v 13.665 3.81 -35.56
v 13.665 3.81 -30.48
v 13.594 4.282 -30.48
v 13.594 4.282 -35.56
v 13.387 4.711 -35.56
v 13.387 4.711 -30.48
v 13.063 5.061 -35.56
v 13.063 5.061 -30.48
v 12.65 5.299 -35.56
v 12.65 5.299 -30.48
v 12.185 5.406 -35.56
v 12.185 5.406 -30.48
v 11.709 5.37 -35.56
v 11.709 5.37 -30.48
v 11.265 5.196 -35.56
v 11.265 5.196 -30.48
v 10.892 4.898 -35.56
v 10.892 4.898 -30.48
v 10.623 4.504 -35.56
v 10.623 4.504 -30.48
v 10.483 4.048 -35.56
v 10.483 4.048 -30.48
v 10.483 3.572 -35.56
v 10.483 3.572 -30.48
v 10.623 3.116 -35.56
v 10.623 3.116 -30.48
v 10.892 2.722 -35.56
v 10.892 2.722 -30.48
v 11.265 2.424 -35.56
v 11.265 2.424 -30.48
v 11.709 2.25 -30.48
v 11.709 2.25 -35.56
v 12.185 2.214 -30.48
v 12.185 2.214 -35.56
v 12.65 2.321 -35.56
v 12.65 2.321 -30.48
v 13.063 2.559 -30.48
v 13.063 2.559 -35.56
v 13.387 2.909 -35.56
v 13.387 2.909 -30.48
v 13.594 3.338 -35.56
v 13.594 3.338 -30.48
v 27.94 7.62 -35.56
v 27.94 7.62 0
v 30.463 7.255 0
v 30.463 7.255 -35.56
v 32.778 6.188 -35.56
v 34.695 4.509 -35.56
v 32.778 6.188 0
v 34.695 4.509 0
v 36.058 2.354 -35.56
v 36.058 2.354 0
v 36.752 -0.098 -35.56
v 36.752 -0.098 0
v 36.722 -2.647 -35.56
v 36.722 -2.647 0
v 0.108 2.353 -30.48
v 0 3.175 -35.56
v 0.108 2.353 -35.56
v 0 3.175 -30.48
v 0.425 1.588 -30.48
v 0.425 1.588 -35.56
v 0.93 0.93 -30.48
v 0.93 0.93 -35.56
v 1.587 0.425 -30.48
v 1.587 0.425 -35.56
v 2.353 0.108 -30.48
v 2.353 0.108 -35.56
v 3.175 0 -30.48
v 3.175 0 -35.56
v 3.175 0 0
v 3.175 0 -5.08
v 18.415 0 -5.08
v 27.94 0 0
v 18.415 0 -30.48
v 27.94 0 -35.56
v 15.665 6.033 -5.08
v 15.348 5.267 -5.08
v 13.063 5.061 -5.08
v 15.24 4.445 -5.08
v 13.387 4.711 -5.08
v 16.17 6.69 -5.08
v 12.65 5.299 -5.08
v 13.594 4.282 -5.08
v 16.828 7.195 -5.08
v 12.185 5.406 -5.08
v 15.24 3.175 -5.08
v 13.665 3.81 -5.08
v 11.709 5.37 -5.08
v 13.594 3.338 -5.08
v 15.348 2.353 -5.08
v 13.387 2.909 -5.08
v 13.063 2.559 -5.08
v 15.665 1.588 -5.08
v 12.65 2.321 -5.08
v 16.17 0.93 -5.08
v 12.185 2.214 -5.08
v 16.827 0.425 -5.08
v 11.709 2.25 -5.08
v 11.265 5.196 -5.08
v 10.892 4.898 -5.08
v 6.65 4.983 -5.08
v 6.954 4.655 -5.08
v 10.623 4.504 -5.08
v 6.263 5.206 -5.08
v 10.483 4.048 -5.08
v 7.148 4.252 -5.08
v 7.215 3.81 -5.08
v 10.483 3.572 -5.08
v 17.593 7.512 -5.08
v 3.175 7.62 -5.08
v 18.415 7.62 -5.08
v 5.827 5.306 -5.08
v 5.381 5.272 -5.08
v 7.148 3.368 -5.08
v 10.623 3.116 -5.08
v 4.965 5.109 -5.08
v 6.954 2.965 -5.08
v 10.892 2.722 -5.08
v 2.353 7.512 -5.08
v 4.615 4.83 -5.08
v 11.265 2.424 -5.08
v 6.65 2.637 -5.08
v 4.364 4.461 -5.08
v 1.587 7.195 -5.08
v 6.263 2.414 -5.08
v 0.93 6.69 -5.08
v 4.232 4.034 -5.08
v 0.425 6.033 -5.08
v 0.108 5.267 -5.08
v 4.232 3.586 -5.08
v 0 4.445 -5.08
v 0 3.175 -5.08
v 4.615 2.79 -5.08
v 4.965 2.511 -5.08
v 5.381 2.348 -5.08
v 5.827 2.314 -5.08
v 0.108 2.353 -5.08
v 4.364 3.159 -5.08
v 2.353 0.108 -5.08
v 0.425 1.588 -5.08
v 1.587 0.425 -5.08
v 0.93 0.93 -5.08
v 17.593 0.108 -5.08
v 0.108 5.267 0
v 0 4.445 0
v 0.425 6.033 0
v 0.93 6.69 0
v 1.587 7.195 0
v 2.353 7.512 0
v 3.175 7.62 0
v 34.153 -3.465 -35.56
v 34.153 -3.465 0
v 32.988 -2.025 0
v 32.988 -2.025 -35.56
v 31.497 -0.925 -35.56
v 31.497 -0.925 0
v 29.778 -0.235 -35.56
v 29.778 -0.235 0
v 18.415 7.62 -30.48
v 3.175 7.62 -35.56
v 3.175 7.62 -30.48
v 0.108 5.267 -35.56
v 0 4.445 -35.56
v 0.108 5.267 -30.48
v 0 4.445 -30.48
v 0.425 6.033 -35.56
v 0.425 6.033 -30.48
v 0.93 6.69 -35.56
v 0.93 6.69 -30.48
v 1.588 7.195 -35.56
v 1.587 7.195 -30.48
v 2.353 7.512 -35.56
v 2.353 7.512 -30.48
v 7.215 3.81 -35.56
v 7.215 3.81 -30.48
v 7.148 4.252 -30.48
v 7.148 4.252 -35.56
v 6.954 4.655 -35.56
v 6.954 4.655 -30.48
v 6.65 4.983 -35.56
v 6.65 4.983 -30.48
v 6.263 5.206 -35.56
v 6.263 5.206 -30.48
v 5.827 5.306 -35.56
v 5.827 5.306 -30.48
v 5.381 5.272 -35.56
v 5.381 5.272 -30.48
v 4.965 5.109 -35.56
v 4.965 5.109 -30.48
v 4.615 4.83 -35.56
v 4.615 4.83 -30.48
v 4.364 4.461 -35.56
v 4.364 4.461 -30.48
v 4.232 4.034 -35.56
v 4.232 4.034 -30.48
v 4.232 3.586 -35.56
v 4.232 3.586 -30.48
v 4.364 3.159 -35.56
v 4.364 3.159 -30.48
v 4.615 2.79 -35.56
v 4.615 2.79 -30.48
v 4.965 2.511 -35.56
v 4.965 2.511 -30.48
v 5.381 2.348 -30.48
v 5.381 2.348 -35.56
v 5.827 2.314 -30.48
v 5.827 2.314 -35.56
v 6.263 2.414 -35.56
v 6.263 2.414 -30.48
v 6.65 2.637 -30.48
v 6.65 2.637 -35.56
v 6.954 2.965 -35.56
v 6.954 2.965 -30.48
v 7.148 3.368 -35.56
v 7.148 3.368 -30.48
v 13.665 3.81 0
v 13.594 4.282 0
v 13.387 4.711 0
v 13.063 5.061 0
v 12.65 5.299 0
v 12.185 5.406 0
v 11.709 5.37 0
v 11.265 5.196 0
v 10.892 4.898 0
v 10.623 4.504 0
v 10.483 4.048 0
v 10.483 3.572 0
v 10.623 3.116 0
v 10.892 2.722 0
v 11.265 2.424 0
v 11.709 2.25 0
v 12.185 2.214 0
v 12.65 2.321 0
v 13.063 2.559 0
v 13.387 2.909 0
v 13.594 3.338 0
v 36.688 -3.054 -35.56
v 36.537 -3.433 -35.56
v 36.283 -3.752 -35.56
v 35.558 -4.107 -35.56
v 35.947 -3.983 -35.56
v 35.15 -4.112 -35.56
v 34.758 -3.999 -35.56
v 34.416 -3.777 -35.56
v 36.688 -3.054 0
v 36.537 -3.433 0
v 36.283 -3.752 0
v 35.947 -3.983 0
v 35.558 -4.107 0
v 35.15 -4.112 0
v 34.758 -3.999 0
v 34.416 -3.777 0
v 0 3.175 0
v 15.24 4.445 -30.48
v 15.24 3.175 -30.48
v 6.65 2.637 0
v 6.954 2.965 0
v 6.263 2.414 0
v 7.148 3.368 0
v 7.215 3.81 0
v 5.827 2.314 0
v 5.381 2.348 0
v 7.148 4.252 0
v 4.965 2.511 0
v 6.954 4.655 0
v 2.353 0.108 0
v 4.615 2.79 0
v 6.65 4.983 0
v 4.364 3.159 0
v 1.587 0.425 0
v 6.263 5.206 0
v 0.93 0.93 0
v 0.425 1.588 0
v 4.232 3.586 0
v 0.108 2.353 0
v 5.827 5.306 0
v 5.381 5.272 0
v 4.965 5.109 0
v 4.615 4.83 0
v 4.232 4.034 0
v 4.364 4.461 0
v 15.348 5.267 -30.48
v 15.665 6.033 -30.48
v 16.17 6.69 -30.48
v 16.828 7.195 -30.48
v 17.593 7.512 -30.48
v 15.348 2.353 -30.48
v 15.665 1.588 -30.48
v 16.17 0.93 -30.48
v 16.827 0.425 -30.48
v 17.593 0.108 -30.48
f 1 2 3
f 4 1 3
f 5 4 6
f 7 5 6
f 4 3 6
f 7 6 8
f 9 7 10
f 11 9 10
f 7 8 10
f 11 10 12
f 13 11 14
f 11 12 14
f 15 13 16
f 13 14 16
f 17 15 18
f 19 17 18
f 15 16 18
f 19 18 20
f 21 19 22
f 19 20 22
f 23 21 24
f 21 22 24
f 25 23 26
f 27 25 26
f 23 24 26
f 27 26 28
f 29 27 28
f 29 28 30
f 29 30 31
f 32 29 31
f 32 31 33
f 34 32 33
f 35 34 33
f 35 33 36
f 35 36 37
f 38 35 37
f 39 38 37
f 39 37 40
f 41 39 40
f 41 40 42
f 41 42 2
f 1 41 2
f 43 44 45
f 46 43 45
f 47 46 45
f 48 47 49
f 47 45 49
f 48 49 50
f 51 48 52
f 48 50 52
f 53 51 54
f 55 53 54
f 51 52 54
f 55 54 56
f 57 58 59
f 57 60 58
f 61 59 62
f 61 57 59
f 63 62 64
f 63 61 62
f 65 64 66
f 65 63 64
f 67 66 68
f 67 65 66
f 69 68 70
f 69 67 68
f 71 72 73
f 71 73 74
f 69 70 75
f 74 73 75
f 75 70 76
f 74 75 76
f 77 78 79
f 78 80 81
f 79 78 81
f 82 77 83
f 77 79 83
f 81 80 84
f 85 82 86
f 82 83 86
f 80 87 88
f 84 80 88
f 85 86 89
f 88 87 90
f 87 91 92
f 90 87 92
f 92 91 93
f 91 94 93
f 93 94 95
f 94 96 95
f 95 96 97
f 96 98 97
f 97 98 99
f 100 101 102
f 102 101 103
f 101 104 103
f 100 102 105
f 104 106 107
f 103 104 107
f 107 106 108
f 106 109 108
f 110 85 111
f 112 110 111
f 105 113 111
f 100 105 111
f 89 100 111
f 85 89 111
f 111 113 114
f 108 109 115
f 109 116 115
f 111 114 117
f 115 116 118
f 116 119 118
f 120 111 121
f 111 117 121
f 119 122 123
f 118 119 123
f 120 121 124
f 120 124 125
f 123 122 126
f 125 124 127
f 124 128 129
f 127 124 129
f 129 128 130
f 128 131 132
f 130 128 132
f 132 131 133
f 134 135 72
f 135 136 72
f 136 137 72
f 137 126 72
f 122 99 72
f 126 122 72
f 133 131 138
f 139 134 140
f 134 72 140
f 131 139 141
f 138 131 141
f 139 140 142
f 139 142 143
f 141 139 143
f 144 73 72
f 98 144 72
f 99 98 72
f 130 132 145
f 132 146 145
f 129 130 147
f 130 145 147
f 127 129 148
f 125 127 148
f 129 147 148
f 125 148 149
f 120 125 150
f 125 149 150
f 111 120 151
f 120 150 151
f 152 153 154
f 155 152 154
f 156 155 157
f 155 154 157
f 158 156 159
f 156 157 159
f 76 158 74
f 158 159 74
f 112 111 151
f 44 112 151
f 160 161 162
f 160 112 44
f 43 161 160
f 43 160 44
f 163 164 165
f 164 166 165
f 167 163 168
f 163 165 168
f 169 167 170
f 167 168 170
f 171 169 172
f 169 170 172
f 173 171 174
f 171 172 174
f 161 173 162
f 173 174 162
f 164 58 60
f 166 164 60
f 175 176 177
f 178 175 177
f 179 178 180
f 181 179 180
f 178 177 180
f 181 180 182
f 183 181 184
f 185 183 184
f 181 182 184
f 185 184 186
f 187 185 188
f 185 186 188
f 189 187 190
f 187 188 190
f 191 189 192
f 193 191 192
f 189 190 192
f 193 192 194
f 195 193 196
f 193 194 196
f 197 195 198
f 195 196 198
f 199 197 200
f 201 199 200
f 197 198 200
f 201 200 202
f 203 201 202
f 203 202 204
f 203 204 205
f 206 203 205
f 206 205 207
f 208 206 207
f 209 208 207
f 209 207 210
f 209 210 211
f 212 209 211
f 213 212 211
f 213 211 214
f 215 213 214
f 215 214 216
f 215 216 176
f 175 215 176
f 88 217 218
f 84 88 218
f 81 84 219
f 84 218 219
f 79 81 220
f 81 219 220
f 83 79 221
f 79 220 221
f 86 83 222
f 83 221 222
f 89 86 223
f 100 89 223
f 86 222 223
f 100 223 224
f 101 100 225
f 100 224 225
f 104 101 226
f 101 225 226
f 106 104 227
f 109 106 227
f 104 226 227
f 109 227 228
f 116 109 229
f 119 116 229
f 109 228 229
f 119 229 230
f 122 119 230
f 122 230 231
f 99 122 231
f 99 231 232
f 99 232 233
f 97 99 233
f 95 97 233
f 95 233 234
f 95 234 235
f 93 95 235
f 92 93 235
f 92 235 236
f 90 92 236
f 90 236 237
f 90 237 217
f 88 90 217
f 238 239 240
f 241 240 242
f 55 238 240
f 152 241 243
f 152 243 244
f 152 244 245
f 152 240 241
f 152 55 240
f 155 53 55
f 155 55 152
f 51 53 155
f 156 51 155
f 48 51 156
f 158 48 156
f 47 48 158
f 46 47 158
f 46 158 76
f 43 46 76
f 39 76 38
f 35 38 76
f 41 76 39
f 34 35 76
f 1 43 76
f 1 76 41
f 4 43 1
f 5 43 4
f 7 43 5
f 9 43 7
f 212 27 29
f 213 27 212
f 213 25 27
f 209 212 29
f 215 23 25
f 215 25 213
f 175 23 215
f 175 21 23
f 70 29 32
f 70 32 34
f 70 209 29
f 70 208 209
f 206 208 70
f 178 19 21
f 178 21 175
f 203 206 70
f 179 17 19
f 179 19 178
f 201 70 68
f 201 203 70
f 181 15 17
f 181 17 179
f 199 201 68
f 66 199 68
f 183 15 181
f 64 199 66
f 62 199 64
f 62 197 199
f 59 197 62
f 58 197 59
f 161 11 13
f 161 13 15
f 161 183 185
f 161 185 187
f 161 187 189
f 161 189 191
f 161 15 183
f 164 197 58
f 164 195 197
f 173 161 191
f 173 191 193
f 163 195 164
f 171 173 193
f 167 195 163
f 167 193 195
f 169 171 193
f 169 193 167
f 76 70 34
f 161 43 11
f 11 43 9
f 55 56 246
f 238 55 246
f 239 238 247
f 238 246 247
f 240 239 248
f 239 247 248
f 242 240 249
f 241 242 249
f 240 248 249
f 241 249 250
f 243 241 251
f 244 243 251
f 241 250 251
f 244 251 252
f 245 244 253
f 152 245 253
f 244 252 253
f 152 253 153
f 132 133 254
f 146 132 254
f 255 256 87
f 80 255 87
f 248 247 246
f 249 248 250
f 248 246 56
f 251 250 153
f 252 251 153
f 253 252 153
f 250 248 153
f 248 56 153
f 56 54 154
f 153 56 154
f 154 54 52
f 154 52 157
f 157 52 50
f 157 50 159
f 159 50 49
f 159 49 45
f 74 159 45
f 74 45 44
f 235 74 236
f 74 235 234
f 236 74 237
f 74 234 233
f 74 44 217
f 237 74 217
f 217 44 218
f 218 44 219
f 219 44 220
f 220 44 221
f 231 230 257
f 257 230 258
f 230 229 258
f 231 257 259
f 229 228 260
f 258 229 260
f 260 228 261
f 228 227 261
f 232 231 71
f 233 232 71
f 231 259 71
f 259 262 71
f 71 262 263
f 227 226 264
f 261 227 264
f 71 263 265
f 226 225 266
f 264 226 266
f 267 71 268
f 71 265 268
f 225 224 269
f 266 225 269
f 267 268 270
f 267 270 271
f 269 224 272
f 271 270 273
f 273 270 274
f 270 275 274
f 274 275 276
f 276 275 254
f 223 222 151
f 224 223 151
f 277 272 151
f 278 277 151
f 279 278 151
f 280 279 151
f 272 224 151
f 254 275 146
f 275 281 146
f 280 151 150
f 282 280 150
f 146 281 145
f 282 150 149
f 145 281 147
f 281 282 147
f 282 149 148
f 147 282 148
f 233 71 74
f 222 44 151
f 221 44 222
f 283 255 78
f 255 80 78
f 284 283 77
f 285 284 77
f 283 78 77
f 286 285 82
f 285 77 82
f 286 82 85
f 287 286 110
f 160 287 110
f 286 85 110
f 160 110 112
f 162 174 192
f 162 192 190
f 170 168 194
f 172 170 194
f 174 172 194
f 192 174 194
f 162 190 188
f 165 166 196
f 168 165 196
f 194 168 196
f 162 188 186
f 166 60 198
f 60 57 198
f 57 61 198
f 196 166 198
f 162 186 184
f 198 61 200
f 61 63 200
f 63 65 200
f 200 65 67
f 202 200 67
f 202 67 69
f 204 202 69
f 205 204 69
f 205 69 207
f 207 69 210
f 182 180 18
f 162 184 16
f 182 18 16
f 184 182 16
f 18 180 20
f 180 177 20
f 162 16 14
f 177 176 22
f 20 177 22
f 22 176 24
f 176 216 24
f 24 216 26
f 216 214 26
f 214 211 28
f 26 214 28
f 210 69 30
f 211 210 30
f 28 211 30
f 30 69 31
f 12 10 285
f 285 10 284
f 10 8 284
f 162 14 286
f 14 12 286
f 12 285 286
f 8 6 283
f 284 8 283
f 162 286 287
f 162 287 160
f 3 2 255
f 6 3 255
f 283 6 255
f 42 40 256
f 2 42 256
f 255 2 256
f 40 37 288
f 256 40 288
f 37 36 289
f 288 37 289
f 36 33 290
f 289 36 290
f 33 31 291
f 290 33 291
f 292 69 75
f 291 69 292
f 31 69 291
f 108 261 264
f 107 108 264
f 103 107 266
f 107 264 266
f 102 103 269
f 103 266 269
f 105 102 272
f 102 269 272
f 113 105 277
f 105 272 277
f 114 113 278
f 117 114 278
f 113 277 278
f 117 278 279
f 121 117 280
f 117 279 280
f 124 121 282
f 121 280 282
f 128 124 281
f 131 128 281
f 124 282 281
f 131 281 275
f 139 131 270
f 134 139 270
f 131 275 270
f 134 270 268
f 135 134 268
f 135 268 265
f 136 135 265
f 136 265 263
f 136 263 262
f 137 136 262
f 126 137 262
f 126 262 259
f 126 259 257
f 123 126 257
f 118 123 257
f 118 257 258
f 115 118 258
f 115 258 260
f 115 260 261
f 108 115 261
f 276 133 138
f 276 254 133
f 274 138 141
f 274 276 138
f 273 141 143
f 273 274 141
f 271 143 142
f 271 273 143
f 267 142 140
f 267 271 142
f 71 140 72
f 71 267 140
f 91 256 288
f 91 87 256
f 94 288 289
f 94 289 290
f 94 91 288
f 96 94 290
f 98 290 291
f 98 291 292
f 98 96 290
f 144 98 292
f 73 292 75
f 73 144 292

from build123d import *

# Parameters (mm, degrees)
BOSS_EXTRUDE1_DEPTH = 7.62
FILLET1_R           = 3.175
SKETCH2_R           = 1.5
SKETCH2_R_2         = 1.6
CUT_EXTRUDE1_DEPTH  = 36.56
BOSS_EXTRUDE2_DEPTH = 35.56


with BuildPart() as part:
    # Sketch1 → Boss-Extrude1 (new body)
    with BuildSketch(Plane(origin=(0, 0, 0), x_dir=(1, 0, 0), z_dir=(0, 1, 0))):
        Polygon((0, 5.08), (0, 0), (27.94, 0), (27.94, 35.56), (0, 35.56), (0, 30.48), (15.24, 30.48), (15.24, 5.08), align=None)
    extrude(amount=BOSS_EXTRUDE1_DEPTH)

    # Fillet1
    fillet1_edges = [part.edges().sort_by_distance(p)[0] for p in [
        (15.24, 7.62, -17.78),
        (0, 0, -2.54),
        (15.24, 0, -17.78),
        (0, 7.62, -2.54),
        (0, 7.62, -33.02),
        (0, 0, -33.02),
    ]]
    fillet(fillet1_edges, radius=FILLET1_R)

    # Sketch2 → Cut-Extrude1 (cut, through all)
    with BuildSketch(Plane.XY):
        with Locations((5.715, 3.81)):
            Circle(SKETCH2_R)
        with Locations((12.065, 3.81)):
            Circle(SKETCH2_R_2)
    extrude(amount=-CUT_EXTRUDE1_DEPTH, mode=Mode.SUBTRACT)

    # Sketch3 → Boss-Extrude2 (add)
    with BuildSketch(Plane.XY):
        with BuildLine():
            Line((27.94, 0), (27.94, 7.62))
            ThreePointArc((27.94, 7.62), (34.695471328, 4.50875779), (36.722362141, -2.647214162))
            ThreePointArc((36.722362141, -2.647214162), (35.75702901, -4.059087707), (34.153122917, -3.465168346))
            ThreePointArc((34.153122917, -3.465168346), (31.497045405, -0.924856567), (27.94, 0))
        make_face()
    extrude(amount=-BOSS_EXTRUDE2_DEPTH)


solid = part.part
